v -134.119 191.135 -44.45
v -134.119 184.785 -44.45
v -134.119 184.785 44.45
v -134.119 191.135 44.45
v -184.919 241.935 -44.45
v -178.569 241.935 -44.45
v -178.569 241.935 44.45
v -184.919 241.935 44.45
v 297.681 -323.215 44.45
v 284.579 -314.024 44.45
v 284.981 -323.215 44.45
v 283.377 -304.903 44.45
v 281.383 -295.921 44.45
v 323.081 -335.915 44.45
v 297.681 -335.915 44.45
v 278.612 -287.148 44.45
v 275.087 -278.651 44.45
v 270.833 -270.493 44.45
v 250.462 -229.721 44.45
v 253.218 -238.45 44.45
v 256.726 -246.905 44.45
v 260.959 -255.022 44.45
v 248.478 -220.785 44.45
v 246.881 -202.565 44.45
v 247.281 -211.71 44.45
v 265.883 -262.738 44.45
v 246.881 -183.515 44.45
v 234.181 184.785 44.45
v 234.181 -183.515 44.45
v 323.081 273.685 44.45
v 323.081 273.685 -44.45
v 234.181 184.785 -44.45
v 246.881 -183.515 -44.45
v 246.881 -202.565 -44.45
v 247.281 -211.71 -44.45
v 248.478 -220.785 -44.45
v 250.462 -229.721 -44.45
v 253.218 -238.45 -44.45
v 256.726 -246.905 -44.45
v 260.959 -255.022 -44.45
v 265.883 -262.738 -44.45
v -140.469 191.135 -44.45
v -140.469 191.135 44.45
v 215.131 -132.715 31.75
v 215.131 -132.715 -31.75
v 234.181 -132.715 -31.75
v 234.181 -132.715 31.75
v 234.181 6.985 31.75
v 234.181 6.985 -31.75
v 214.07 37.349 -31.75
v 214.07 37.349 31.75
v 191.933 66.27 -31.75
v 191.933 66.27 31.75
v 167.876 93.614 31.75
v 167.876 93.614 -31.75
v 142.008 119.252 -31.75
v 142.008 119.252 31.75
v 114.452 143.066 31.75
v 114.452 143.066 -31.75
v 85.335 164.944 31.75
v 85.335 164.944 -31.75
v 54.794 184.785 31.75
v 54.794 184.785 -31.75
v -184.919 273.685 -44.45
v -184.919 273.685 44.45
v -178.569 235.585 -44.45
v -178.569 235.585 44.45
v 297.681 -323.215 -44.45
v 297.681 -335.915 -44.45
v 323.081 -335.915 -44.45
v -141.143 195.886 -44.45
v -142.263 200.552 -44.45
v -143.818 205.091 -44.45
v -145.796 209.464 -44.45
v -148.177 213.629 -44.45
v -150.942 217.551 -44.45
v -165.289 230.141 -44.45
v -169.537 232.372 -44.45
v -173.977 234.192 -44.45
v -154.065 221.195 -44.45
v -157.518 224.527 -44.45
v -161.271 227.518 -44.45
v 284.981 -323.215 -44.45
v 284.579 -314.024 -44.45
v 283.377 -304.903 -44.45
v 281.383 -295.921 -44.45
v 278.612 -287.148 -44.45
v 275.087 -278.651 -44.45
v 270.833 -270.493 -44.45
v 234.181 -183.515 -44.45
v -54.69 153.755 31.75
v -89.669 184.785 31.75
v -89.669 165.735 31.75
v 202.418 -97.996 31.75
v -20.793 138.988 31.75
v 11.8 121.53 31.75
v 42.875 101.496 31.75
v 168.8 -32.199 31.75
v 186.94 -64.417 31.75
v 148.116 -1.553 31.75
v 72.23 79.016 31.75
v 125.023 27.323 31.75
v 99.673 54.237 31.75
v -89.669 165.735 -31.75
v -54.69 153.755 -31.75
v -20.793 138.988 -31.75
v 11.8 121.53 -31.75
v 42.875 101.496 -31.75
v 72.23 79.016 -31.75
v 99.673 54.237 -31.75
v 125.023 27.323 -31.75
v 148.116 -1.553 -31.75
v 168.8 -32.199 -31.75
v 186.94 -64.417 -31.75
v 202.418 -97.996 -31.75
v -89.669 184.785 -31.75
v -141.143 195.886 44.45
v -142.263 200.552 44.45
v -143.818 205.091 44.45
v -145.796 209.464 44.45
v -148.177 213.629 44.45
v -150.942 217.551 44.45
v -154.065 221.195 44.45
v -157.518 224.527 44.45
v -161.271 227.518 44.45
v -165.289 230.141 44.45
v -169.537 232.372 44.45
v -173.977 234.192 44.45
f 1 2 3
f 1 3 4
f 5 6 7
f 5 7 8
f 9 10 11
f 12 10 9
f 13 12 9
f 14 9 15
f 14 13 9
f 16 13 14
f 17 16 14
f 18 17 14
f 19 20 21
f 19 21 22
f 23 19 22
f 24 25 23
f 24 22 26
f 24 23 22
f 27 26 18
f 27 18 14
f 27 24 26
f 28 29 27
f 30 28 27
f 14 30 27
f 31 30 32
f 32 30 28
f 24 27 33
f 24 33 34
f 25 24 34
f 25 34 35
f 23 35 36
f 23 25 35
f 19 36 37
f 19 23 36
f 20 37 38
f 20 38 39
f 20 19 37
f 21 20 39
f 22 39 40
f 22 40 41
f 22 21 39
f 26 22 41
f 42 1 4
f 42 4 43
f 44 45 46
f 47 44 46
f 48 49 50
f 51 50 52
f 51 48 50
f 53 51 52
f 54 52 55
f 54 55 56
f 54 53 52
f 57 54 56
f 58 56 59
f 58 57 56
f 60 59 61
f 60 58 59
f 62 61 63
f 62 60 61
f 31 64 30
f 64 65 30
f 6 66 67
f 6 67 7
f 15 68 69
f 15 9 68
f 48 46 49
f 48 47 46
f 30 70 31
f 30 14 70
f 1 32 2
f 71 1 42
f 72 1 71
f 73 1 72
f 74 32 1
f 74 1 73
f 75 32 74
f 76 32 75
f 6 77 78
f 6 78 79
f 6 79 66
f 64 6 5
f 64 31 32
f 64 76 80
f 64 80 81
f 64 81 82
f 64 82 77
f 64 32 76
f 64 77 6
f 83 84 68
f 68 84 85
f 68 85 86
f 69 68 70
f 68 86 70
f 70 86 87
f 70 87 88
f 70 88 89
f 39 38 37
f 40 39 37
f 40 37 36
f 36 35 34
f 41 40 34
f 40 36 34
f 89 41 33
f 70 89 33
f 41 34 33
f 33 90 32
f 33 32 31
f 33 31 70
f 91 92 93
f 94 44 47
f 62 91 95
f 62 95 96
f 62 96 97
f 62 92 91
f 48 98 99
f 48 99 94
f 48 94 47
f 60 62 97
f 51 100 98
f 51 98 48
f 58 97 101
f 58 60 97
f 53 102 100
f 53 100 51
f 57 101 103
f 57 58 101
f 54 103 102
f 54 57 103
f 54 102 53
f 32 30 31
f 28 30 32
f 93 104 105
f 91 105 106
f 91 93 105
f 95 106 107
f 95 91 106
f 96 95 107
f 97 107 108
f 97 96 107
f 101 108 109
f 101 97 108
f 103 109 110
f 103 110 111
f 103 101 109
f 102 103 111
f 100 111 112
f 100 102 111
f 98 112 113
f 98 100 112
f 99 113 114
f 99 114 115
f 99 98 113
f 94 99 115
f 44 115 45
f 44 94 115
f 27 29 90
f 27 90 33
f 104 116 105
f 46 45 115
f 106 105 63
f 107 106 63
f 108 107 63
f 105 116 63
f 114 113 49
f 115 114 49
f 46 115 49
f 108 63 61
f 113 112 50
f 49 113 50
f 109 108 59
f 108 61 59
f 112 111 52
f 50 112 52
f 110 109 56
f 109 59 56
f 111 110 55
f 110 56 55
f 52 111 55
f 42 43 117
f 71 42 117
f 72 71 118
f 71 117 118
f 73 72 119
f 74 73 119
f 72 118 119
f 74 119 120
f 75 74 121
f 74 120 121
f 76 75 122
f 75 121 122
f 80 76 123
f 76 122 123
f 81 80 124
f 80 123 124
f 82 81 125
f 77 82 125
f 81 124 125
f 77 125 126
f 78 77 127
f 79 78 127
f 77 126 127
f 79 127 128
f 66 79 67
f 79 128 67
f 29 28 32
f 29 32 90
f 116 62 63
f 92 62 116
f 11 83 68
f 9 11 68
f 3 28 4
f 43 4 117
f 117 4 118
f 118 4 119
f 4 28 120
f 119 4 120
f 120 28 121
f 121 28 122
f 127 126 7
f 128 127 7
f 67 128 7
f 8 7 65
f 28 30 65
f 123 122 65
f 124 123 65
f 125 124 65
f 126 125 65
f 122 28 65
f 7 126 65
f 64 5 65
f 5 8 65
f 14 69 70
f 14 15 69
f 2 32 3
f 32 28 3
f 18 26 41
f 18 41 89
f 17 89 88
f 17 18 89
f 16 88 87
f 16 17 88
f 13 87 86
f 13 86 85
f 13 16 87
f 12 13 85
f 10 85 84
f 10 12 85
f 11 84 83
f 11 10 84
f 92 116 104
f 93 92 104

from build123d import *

# Parameters (mm, degrees)
BOSS_EXTRUDE1_DEPTH = 44.45
BOSS_EXTRUDE2_DEPTH = 31.75
BOSS_EXTRUDE3_DEPTH = 44.45


with BuildPart() as part:
    # Sketch1 → Boss-Extrude1 (new body, symmetric)
    with BuildSketch(Plane.XY):
        with BuildLine():
            Line((-178.568776984, 235.585), (-178.568776984, 241.935))
            Line((-178.568776984, 241.935), (-184.918776984, 241.935))
            Line((-184.918776984, 241.935), (-184.918776984, 273.685))
            Line((-184.918776984, 273.685), (323.081223016, 273.685))
            Line((323.081223016, 273.685), (234.181223016, 184.785))
            Line((234.181223016, 184.785), (-134.118776984, 184.785))
            Line((-134.118776984, 184.785), (-134.118776984, 191.135))
            Line((-134.118776984, 191.135), (-140.468776984, 191.135))
            ThreePointArc((-140.468776984, 191.135), (-152.460423906, 219.410016924), (-178.568776984, 235.585))
        make_face()
    extrude(amount=BOSS_EXTRUDE1_DEPTH, both=True)


with BuildPart() as body_2:
    # Sketch1_3 → Boss-Extrude2 (new body, symmetric)
    with BuildSketch(Plane.XY):
        with BuildLine():
            ThreePointArc((234.181223016, 6.985), (155.160715929, 106.653539725), (54.793723016, 184.785))
            Line((54.793723016, 184.785), (-89.668776984, 184.785))
            Line((-89.668776984, 184.785), (-89.668776984, 165.735))
            ThreePointArc((-89.668776984, 165.735), (99.67260633, 54.237370194), (215.131223016, -132.715))
            Line((215.131223016, -132.715), (234.181223016, -132.715))
            Line((234.181223016, -132.715), (234.181223016, 6.985))
        make_face()
    extrude(amount=BOSS_EXTRUDE2_DEPTH, both=True)


with BuildPart() as body_3:
    # Sketch1_4 → Boss-Extrude3 (new body, symmetric)
    with BuildSketch(Plane.XY):
        with BuildLine():
            Line((323.081223016, -335.915), (323.081223016, 273.685))
            Line((323.081223016, 273.685), (234.181223016, 184.785))
            Line((234.181223016, 184.785), (234.181223016, -183.515))
            Line((234.181223016, -183.515), (246.881223016, -183.515))
            Line((246.881223016, -183.515), (246.881223016, -202.565))
            ThreePointArc((246.881223016, -202.565), (251.744599276, -234.116039076), (265.883238129, -262.738047859))
            ThreePointArc((265.883238129, -262.738047859), (280.093284249, -291.504612242), (284.981223016, -323.215))
            Line((284.981223016, -323.215), (297.681223016, -323.215))
            Line((297.681223016, -323.215), (297.681223016, -335.915))
            Line((297.681223016, -335.915), (323.081223016, -335.915))
        make_face()
    extrude(amount=BOSS_EXTRUDE3_DEPTH, both=True)


solid = Compound([part.part, body_2.part, body_3.part])
